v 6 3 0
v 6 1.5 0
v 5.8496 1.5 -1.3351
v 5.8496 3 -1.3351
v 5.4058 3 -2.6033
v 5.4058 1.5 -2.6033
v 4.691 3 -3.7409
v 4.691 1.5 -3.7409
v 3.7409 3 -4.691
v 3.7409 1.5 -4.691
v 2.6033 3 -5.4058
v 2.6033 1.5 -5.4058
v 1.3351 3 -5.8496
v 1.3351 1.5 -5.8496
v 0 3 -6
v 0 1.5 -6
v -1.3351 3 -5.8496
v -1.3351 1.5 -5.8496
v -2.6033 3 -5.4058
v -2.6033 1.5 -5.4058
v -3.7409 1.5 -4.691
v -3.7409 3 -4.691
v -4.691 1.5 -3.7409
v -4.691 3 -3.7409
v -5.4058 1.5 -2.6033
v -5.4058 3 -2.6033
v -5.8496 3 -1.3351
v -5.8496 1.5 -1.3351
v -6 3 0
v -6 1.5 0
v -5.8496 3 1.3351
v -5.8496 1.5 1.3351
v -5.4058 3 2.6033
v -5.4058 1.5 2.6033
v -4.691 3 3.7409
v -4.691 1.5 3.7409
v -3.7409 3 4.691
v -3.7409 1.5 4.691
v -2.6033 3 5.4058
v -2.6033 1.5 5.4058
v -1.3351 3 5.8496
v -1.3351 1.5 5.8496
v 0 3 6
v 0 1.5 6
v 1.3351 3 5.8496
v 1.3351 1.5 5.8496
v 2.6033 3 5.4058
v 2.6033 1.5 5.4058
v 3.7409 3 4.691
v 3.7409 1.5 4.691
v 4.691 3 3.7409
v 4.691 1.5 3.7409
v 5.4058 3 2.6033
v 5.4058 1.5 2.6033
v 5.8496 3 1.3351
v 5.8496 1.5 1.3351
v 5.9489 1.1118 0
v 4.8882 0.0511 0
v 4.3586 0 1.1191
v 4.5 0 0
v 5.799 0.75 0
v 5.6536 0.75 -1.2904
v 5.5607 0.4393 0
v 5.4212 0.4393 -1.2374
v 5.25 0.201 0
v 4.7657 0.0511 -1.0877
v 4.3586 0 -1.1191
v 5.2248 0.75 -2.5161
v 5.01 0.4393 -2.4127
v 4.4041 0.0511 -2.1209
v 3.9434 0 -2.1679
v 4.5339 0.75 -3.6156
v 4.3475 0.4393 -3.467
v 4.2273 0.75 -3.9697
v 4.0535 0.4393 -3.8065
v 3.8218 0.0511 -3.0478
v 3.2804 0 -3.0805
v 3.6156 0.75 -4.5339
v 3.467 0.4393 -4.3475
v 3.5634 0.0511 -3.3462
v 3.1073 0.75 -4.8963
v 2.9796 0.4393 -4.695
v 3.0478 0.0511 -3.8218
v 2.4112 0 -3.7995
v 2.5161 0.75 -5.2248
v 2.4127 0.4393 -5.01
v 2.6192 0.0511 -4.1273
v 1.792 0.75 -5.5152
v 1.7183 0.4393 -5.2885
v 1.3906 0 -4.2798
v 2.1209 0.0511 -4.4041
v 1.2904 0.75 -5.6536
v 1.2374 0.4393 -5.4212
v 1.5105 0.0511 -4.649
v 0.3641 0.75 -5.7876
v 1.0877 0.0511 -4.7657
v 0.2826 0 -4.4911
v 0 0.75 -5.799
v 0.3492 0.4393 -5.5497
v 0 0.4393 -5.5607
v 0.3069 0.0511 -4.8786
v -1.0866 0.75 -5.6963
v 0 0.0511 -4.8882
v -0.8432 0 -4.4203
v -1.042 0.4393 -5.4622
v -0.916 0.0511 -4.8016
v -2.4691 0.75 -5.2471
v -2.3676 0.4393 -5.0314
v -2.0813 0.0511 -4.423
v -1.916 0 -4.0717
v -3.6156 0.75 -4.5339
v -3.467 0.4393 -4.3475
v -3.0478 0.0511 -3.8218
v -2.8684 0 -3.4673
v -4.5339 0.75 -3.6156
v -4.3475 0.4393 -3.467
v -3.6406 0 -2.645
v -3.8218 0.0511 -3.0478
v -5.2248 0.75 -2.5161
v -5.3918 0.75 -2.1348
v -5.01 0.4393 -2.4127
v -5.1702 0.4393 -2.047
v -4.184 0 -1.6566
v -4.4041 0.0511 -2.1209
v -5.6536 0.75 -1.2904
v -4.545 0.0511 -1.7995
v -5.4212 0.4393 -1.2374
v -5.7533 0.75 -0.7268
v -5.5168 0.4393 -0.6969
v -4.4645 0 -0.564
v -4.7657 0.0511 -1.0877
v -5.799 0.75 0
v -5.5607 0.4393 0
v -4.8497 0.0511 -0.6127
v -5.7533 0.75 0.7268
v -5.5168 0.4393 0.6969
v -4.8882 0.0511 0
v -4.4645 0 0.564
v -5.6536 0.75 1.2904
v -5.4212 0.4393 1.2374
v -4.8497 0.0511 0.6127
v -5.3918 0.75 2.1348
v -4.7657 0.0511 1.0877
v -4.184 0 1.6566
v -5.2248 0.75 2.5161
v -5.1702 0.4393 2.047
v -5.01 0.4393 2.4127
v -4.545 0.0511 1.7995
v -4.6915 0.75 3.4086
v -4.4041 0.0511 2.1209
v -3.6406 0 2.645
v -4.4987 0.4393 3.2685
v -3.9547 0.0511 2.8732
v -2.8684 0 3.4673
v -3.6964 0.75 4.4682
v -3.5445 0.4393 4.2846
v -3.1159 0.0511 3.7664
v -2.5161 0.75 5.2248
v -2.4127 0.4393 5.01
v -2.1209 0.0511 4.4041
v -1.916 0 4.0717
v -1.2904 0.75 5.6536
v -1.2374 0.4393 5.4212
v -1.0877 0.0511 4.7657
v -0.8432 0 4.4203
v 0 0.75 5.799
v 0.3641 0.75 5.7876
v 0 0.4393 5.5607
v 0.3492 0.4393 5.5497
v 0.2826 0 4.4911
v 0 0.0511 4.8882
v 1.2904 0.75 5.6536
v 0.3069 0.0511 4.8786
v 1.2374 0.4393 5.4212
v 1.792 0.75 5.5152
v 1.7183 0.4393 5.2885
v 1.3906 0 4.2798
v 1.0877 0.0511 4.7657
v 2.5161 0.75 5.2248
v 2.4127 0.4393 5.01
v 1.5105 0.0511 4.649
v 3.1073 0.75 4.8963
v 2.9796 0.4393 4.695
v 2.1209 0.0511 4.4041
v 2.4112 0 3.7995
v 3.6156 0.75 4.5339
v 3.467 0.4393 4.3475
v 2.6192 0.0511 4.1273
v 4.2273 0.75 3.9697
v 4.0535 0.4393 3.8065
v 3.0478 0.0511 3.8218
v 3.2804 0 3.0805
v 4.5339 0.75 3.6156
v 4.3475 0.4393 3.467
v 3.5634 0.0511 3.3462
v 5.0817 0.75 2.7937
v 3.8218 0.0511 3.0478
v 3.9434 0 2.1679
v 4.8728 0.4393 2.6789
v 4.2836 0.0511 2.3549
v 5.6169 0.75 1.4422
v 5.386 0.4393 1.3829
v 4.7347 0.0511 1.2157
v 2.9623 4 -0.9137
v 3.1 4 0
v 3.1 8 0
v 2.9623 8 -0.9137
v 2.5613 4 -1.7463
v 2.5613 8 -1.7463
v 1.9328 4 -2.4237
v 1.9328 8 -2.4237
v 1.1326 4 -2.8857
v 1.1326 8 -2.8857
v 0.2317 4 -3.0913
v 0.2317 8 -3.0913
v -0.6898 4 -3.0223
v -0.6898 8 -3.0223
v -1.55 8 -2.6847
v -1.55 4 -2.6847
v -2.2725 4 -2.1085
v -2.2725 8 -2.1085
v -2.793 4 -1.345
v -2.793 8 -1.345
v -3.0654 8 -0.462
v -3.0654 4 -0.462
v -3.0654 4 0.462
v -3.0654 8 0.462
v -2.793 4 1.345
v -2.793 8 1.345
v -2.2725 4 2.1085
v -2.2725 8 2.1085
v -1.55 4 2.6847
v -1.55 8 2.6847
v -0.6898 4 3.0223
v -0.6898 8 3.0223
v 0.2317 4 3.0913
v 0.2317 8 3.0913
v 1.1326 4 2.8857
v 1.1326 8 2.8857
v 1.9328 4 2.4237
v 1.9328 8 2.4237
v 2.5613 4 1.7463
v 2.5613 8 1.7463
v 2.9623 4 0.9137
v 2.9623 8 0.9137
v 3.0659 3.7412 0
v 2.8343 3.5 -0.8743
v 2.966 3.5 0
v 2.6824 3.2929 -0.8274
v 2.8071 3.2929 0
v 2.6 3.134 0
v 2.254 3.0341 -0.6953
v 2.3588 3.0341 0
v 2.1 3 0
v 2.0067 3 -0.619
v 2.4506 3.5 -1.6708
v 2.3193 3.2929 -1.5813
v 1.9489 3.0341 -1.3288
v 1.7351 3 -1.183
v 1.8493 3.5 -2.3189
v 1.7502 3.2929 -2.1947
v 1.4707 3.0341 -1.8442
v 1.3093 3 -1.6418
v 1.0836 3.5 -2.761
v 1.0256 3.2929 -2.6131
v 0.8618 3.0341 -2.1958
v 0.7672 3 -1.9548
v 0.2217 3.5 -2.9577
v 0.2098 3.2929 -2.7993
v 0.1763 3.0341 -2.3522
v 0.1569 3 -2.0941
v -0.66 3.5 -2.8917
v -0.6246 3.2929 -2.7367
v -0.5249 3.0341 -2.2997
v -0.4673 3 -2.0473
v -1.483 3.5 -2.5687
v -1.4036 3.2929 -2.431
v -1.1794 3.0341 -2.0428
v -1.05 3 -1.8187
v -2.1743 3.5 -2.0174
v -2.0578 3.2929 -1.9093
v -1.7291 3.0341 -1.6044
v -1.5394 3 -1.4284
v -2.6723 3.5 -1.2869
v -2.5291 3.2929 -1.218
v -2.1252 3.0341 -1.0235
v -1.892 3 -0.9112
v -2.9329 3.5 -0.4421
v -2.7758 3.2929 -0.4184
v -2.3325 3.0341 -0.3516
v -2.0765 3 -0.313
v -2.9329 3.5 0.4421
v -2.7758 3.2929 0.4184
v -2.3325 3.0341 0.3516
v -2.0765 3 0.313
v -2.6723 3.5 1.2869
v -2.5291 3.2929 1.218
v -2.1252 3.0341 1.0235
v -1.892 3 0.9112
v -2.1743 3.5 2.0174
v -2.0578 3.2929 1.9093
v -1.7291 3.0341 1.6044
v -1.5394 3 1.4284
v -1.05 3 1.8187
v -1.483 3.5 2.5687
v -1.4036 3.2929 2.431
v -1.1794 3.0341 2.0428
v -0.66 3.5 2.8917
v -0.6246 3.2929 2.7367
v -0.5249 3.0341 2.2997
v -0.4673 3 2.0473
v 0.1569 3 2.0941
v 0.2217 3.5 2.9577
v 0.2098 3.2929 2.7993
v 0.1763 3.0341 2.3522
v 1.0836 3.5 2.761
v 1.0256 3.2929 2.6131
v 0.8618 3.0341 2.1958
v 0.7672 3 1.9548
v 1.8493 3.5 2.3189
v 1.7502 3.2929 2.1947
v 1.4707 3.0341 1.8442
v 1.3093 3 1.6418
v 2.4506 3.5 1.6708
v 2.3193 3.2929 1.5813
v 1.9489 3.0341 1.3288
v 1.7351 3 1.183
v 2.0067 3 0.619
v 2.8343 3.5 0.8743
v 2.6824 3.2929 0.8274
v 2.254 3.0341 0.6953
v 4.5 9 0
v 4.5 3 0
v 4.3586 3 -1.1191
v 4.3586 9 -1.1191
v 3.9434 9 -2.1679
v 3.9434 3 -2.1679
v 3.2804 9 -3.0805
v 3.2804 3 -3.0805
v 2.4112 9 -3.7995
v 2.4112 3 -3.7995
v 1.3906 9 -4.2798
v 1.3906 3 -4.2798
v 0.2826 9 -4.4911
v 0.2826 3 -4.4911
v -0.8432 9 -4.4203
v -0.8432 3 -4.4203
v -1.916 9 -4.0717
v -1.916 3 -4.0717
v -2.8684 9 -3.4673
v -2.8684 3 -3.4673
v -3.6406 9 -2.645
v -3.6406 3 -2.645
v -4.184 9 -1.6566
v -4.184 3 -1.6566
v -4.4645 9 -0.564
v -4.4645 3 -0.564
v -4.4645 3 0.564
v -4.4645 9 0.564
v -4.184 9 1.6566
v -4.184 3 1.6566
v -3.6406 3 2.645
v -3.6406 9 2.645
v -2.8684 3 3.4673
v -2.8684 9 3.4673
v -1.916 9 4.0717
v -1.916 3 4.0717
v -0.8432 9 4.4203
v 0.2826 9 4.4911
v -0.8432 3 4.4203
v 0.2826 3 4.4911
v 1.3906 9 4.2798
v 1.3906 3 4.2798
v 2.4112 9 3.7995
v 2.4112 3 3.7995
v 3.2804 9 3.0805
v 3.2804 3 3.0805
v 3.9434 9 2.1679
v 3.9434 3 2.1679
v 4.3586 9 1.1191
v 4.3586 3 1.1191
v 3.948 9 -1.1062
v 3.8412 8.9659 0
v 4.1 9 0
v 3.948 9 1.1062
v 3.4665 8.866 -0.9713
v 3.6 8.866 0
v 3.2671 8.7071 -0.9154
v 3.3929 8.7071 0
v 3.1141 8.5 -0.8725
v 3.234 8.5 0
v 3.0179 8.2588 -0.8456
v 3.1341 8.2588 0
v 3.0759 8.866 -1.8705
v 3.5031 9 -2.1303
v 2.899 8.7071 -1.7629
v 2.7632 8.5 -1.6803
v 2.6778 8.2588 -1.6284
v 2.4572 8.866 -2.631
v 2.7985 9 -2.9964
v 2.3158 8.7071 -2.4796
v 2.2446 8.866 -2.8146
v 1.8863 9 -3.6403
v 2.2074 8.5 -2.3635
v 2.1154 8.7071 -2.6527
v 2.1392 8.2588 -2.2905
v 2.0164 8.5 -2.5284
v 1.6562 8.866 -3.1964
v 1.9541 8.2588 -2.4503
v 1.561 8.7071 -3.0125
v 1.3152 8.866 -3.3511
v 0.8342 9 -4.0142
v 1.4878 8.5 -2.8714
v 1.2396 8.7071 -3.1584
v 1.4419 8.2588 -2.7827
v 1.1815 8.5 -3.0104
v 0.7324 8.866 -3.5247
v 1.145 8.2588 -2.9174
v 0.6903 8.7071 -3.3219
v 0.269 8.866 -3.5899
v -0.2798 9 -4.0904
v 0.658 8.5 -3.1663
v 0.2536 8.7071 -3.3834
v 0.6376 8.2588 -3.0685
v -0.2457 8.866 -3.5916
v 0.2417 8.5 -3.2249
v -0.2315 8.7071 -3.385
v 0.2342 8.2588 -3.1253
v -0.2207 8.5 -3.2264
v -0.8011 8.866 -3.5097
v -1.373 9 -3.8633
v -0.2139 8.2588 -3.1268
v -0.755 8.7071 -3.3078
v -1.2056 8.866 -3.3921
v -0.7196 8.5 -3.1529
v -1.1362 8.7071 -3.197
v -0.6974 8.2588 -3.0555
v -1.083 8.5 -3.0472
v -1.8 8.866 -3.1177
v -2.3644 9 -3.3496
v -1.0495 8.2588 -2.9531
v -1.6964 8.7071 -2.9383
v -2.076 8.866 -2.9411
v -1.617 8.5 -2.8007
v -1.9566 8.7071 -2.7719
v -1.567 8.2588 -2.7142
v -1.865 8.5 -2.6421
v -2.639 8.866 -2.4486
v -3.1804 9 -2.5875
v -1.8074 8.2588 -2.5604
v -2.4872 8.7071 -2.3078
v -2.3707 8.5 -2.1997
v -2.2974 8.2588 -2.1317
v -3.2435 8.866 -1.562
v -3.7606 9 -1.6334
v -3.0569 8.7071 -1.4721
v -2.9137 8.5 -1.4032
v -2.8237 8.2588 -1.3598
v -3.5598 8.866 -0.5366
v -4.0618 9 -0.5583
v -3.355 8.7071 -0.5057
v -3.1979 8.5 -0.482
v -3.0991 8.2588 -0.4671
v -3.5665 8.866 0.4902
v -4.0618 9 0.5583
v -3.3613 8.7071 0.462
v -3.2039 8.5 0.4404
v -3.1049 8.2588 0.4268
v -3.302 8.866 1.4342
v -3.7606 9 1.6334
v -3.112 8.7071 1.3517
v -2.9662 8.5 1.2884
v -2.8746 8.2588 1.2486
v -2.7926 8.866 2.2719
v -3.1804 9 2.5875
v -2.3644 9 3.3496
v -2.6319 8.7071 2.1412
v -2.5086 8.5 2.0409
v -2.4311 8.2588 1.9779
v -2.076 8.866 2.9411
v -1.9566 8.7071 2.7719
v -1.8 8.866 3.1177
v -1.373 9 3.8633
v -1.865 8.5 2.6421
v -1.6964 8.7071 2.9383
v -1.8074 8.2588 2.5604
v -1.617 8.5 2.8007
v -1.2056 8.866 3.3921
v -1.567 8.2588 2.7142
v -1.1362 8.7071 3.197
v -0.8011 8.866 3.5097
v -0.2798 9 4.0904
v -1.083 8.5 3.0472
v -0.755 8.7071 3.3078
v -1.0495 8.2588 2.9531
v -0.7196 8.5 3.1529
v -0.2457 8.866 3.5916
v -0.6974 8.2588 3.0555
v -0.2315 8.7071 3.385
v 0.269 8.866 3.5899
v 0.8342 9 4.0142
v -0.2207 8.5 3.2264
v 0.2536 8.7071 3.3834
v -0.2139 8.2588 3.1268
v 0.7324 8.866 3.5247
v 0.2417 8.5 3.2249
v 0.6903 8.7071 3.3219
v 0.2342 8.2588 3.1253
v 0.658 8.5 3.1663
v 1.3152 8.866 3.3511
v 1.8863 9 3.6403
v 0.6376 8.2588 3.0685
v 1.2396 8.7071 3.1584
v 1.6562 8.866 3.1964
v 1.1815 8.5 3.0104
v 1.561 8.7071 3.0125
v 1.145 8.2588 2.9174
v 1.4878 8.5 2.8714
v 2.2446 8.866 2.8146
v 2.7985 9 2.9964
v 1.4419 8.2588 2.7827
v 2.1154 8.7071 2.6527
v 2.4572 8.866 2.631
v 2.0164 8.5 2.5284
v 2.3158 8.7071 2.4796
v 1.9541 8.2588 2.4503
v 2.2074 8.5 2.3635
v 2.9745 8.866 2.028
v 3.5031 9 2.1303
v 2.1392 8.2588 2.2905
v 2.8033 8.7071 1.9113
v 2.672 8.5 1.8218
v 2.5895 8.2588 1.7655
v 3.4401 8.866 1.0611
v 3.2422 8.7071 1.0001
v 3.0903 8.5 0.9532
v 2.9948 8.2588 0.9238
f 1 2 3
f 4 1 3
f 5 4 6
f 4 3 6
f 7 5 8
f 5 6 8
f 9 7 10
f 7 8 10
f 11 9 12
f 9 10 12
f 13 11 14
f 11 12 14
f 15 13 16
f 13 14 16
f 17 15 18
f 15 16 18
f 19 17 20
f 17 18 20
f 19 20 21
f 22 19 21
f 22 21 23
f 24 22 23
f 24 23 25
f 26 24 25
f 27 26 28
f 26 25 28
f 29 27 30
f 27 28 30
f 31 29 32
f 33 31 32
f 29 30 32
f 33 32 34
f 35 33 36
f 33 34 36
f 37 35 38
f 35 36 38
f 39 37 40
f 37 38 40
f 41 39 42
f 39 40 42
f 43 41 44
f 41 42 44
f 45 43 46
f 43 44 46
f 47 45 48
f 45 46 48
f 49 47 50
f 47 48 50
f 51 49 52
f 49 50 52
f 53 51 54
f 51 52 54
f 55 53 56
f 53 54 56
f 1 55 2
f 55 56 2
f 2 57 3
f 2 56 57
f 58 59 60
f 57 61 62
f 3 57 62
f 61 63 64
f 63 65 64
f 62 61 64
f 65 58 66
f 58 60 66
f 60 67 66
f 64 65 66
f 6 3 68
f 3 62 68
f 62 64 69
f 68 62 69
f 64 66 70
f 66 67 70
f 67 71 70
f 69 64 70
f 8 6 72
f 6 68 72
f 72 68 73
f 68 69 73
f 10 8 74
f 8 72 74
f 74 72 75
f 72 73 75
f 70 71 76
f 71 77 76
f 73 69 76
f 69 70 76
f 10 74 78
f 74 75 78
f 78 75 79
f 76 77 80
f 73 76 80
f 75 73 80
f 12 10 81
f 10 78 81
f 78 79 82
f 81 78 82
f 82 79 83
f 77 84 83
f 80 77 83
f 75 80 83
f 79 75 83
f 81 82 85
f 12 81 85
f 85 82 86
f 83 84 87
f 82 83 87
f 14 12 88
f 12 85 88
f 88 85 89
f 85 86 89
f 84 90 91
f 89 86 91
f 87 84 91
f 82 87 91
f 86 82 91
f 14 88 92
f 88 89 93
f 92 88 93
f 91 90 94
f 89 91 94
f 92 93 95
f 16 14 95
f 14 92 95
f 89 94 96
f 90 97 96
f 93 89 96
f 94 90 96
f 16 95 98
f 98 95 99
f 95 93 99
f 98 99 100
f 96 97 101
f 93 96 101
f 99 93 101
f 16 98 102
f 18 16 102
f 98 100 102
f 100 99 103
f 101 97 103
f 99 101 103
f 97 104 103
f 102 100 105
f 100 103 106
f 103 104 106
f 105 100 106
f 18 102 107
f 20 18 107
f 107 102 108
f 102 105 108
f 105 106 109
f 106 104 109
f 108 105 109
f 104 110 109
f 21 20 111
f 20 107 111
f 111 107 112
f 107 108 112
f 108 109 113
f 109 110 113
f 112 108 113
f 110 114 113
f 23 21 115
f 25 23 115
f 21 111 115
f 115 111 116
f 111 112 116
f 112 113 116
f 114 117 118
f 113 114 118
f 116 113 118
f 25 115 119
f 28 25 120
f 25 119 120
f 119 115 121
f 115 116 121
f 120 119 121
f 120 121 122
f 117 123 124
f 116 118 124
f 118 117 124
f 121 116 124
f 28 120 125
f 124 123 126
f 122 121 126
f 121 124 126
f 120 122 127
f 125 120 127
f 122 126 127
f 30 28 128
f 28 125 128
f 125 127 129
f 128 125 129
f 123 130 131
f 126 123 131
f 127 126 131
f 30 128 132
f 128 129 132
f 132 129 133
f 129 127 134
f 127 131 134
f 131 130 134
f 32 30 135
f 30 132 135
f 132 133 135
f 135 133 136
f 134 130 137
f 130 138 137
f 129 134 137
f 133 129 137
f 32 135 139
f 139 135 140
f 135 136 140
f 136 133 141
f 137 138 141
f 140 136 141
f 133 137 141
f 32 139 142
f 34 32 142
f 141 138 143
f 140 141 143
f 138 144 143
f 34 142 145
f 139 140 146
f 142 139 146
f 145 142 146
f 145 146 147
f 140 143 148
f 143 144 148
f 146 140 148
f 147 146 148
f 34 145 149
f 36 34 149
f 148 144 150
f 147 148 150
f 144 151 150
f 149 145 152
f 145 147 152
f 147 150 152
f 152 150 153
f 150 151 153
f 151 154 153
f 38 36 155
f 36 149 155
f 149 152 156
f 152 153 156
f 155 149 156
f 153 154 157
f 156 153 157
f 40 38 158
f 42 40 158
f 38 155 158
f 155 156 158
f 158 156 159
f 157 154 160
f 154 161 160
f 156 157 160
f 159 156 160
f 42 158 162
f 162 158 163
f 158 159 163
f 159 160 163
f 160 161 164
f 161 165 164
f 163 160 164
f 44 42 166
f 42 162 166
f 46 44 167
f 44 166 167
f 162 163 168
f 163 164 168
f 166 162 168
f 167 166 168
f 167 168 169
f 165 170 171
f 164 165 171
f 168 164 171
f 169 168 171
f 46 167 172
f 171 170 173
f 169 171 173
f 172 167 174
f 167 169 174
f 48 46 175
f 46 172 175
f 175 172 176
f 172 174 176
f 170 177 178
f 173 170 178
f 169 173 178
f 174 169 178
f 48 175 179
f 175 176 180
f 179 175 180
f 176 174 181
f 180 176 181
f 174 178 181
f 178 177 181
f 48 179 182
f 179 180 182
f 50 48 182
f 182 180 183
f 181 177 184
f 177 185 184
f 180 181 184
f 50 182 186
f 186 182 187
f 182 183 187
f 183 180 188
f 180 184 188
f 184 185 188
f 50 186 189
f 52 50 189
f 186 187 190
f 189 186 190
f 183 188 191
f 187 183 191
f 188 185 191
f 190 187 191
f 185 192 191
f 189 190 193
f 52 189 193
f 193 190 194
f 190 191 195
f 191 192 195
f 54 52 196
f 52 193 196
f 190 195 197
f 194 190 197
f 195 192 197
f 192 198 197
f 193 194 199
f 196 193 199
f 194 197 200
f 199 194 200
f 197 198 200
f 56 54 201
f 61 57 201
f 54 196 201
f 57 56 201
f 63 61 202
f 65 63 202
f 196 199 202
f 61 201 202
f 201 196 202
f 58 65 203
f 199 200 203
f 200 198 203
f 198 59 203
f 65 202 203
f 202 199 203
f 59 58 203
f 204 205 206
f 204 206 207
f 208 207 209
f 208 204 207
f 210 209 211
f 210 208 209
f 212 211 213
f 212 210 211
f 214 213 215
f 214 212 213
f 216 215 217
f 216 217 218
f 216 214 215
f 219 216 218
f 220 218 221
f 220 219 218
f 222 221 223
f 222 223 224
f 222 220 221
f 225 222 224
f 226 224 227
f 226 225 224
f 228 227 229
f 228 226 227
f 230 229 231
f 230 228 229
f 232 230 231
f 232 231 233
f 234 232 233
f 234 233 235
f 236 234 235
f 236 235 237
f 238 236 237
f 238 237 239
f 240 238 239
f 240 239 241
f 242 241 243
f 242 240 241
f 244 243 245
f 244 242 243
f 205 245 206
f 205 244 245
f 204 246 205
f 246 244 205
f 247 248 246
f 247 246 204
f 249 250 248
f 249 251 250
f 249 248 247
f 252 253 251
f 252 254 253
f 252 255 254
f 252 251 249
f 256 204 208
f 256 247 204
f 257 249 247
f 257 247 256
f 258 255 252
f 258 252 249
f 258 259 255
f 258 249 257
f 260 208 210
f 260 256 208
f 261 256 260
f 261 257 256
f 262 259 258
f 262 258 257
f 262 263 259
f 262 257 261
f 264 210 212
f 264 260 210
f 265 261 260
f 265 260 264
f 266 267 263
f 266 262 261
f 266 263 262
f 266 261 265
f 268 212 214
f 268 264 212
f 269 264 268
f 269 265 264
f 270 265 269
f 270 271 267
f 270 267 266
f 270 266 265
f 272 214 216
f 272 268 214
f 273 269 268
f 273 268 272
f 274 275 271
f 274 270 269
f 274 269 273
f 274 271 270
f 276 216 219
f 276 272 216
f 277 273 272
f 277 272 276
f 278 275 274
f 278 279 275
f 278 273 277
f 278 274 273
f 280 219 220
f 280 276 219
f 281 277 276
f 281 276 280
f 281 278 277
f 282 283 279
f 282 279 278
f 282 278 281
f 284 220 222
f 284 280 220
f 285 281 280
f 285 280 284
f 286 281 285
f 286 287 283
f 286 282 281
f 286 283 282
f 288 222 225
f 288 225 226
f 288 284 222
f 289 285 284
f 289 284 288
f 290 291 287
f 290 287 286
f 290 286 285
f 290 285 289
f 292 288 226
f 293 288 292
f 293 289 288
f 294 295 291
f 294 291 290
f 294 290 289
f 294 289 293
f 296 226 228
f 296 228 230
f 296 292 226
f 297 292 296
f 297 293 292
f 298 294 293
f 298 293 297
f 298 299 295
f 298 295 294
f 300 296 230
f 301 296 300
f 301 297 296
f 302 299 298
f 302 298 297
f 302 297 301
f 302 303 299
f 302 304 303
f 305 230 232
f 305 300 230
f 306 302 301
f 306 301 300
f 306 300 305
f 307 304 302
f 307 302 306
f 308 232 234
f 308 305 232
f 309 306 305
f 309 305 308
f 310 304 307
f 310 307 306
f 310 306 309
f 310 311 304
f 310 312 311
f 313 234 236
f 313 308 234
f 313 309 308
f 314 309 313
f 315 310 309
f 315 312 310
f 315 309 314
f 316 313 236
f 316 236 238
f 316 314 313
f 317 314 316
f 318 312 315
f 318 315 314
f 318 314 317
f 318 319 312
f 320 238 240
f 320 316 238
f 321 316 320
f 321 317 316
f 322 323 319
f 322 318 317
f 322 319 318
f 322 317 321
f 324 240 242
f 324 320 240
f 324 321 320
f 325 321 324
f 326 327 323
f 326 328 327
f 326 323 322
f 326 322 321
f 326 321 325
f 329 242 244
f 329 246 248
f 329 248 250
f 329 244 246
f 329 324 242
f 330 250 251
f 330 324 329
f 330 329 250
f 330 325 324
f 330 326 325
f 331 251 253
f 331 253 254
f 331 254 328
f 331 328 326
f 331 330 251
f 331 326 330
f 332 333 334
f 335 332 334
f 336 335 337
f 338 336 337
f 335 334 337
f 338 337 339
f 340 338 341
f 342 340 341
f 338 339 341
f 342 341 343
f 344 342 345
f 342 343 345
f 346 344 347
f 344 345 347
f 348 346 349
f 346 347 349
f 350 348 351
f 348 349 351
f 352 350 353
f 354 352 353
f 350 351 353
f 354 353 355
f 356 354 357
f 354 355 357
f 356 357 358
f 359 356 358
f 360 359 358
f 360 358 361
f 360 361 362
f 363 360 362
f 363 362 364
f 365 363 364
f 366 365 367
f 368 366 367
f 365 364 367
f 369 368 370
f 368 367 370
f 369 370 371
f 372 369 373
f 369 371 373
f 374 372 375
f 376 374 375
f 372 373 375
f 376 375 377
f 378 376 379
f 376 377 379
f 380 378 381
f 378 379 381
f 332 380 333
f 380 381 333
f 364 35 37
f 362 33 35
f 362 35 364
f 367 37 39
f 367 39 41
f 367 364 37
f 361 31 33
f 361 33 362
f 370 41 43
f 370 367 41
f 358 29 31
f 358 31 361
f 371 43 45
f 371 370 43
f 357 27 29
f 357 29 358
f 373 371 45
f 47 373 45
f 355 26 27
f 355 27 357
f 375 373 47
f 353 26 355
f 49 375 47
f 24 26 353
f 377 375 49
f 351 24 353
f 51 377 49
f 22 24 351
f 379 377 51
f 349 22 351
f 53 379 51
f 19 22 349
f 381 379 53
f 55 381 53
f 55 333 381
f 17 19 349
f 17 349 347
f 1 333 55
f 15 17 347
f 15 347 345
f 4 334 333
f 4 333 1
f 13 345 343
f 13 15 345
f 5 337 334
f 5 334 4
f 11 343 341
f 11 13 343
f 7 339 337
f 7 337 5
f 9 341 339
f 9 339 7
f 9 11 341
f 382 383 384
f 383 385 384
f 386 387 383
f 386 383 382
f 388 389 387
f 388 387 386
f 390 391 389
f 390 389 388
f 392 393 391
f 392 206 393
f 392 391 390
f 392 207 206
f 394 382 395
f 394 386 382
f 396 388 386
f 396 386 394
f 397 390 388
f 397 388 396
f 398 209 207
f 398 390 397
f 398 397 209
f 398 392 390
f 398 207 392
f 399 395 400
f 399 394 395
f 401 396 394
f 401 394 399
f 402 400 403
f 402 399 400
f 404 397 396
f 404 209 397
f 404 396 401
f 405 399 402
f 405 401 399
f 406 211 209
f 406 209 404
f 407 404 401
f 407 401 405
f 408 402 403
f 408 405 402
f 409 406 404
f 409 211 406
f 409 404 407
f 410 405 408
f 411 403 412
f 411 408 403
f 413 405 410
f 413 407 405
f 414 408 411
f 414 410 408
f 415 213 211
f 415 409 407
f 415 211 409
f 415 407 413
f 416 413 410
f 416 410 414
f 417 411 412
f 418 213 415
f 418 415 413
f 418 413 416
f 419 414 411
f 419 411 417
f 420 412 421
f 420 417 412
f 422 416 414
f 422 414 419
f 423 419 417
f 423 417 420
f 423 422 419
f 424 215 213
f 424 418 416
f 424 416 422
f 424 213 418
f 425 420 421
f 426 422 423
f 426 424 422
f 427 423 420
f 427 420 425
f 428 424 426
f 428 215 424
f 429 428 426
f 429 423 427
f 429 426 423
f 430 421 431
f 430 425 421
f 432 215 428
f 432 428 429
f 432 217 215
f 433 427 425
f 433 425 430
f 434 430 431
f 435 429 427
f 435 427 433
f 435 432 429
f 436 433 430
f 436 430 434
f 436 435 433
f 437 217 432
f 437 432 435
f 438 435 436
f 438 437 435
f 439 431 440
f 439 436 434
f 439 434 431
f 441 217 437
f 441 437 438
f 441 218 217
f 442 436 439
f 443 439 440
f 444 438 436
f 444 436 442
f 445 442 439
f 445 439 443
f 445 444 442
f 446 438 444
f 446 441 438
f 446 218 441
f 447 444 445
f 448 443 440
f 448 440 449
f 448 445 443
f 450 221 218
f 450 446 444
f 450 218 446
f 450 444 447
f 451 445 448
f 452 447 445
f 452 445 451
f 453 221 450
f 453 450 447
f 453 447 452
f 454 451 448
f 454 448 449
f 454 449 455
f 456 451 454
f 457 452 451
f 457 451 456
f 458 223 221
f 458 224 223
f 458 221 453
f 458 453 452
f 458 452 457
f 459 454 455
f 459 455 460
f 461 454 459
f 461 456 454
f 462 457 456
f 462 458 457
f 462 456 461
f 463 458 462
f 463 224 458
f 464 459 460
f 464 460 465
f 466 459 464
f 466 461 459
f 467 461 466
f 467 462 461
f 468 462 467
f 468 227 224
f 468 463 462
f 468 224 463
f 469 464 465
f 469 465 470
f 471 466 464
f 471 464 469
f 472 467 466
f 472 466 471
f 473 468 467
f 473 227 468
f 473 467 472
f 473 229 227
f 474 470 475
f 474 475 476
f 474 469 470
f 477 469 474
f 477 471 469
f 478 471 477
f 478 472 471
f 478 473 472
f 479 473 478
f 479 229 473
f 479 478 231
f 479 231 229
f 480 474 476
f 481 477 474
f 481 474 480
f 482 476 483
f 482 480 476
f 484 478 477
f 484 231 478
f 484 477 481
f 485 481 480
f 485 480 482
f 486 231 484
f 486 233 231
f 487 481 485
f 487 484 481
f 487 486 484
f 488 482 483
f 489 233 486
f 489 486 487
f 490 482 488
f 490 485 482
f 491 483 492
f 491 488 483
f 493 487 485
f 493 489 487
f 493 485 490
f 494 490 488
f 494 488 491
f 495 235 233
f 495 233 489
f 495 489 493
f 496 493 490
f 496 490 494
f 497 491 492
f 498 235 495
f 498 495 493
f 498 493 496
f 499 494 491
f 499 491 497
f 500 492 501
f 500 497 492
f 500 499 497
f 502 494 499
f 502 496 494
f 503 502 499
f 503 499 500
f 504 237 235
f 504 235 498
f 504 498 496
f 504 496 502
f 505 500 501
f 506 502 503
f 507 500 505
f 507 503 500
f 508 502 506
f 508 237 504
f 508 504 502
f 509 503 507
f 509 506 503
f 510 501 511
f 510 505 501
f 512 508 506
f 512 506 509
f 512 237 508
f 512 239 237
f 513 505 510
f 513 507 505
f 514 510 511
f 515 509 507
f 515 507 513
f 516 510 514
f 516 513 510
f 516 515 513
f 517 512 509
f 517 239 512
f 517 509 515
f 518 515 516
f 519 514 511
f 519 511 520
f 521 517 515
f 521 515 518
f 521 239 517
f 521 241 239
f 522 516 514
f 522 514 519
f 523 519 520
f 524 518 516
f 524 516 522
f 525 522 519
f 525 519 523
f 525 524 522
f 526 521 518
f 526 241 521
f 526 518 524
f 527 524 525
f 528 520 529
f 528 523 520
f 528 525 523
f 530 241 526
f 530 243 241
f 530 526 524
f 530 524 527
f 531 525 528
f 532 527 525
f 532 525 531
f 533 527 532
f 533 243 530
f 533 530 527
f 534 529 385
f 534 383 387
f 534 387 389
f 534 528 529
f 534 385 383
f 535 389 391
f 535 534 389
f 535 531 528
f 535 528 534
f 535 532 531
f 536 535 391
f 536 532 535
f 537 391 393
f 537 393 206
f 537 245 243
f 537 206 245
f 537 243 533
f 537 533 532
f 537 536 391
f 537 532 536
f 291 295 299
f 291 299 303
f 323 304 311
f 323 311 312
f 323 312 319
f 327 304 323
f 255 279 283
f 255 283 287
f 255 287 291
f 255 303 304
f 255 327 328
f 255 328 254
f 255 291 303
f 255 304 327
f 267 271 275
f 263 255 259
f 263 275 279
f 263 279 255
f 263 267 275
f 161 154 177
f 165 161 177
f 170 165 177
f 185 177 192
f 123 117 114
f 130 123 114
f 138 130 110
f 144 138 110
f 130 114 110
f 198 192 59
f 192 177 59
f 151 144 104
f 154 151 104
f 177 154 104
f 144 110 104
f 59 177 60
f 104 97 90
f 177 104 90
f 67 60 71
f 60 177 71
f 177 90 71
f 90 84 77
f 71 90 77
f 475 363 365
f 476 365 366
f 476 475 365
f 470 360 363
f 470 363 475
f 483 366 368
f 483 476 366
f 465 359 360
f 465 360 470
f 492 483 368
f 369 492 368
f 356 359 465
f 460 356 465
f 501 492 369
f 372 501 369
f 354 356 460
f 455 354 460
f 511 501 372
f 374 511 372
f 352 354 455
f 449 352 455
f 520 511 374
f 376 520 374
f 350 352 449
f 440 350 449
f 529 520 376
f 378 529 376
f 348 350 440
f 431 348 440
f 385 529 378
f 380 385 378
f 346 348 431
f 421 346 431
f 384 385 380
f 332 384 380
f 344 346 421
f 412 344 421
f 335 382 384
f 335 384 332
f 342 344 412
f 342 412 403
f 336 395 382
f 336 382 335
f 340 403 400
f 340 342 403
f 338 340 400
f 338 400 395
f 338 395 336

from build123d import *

# Parameters (mm, degrees)
SKETCH_1_R        = 6
EXTRUDE_1_DEPTH   = 3
SKETCH_2_R        = 4.5
SKETCH_2_R_2      = 3.1
EXTRUDE_1_2_DEPTH = 6
FILLET_1_R        = 1
FILLET_2_R        = 1.5


with BuildPart() as part:
    # ｽｹｯﾁ1 → Extrude 1 (new body)
    with BuildSketch(Plane(origin=(0, 0, 0), x_dir=(1, 0, 0), z_dir=(0, 1, 0))):
        Circle(SKETCH_1_R)
    extrude(amount=EXTRUDE_1_DEPTH)

    # ｽｹｯﾁ2 → Extrude 1 2 (add)
    with BuildSketch(Plane(origin=(0, 3, 0), x_dir=(1, 0, 0), z_dir=(0, 1, 0))):
        Circle(SKETCH_2_R)
        Circle(SKETCH_2_R_2, mode=Mode.SUBTRACT)
    extrude(amount=EXTRUDE_1_2_DEPTH)

    # ﾌｨﾚｯﾄ1
    fillet_1_edges = [part.edges().sort_by_distance(p)[0] for p in [
        (-3.1, 3, 0),
        (-3.1, 9, 0),
    ]]
    fillet(fillet_1_edges, radius=FILLET_1_R)

    # ﾌｨﾚｯﾄ2
    fillet_2_edges = [part.edges().sort_by_distance(p)[0] for p in [
        (-6, 0, 0),
    ]]
    fillet(fillet_2_edges, radius=FILLET_2_R)


solid = part.part
